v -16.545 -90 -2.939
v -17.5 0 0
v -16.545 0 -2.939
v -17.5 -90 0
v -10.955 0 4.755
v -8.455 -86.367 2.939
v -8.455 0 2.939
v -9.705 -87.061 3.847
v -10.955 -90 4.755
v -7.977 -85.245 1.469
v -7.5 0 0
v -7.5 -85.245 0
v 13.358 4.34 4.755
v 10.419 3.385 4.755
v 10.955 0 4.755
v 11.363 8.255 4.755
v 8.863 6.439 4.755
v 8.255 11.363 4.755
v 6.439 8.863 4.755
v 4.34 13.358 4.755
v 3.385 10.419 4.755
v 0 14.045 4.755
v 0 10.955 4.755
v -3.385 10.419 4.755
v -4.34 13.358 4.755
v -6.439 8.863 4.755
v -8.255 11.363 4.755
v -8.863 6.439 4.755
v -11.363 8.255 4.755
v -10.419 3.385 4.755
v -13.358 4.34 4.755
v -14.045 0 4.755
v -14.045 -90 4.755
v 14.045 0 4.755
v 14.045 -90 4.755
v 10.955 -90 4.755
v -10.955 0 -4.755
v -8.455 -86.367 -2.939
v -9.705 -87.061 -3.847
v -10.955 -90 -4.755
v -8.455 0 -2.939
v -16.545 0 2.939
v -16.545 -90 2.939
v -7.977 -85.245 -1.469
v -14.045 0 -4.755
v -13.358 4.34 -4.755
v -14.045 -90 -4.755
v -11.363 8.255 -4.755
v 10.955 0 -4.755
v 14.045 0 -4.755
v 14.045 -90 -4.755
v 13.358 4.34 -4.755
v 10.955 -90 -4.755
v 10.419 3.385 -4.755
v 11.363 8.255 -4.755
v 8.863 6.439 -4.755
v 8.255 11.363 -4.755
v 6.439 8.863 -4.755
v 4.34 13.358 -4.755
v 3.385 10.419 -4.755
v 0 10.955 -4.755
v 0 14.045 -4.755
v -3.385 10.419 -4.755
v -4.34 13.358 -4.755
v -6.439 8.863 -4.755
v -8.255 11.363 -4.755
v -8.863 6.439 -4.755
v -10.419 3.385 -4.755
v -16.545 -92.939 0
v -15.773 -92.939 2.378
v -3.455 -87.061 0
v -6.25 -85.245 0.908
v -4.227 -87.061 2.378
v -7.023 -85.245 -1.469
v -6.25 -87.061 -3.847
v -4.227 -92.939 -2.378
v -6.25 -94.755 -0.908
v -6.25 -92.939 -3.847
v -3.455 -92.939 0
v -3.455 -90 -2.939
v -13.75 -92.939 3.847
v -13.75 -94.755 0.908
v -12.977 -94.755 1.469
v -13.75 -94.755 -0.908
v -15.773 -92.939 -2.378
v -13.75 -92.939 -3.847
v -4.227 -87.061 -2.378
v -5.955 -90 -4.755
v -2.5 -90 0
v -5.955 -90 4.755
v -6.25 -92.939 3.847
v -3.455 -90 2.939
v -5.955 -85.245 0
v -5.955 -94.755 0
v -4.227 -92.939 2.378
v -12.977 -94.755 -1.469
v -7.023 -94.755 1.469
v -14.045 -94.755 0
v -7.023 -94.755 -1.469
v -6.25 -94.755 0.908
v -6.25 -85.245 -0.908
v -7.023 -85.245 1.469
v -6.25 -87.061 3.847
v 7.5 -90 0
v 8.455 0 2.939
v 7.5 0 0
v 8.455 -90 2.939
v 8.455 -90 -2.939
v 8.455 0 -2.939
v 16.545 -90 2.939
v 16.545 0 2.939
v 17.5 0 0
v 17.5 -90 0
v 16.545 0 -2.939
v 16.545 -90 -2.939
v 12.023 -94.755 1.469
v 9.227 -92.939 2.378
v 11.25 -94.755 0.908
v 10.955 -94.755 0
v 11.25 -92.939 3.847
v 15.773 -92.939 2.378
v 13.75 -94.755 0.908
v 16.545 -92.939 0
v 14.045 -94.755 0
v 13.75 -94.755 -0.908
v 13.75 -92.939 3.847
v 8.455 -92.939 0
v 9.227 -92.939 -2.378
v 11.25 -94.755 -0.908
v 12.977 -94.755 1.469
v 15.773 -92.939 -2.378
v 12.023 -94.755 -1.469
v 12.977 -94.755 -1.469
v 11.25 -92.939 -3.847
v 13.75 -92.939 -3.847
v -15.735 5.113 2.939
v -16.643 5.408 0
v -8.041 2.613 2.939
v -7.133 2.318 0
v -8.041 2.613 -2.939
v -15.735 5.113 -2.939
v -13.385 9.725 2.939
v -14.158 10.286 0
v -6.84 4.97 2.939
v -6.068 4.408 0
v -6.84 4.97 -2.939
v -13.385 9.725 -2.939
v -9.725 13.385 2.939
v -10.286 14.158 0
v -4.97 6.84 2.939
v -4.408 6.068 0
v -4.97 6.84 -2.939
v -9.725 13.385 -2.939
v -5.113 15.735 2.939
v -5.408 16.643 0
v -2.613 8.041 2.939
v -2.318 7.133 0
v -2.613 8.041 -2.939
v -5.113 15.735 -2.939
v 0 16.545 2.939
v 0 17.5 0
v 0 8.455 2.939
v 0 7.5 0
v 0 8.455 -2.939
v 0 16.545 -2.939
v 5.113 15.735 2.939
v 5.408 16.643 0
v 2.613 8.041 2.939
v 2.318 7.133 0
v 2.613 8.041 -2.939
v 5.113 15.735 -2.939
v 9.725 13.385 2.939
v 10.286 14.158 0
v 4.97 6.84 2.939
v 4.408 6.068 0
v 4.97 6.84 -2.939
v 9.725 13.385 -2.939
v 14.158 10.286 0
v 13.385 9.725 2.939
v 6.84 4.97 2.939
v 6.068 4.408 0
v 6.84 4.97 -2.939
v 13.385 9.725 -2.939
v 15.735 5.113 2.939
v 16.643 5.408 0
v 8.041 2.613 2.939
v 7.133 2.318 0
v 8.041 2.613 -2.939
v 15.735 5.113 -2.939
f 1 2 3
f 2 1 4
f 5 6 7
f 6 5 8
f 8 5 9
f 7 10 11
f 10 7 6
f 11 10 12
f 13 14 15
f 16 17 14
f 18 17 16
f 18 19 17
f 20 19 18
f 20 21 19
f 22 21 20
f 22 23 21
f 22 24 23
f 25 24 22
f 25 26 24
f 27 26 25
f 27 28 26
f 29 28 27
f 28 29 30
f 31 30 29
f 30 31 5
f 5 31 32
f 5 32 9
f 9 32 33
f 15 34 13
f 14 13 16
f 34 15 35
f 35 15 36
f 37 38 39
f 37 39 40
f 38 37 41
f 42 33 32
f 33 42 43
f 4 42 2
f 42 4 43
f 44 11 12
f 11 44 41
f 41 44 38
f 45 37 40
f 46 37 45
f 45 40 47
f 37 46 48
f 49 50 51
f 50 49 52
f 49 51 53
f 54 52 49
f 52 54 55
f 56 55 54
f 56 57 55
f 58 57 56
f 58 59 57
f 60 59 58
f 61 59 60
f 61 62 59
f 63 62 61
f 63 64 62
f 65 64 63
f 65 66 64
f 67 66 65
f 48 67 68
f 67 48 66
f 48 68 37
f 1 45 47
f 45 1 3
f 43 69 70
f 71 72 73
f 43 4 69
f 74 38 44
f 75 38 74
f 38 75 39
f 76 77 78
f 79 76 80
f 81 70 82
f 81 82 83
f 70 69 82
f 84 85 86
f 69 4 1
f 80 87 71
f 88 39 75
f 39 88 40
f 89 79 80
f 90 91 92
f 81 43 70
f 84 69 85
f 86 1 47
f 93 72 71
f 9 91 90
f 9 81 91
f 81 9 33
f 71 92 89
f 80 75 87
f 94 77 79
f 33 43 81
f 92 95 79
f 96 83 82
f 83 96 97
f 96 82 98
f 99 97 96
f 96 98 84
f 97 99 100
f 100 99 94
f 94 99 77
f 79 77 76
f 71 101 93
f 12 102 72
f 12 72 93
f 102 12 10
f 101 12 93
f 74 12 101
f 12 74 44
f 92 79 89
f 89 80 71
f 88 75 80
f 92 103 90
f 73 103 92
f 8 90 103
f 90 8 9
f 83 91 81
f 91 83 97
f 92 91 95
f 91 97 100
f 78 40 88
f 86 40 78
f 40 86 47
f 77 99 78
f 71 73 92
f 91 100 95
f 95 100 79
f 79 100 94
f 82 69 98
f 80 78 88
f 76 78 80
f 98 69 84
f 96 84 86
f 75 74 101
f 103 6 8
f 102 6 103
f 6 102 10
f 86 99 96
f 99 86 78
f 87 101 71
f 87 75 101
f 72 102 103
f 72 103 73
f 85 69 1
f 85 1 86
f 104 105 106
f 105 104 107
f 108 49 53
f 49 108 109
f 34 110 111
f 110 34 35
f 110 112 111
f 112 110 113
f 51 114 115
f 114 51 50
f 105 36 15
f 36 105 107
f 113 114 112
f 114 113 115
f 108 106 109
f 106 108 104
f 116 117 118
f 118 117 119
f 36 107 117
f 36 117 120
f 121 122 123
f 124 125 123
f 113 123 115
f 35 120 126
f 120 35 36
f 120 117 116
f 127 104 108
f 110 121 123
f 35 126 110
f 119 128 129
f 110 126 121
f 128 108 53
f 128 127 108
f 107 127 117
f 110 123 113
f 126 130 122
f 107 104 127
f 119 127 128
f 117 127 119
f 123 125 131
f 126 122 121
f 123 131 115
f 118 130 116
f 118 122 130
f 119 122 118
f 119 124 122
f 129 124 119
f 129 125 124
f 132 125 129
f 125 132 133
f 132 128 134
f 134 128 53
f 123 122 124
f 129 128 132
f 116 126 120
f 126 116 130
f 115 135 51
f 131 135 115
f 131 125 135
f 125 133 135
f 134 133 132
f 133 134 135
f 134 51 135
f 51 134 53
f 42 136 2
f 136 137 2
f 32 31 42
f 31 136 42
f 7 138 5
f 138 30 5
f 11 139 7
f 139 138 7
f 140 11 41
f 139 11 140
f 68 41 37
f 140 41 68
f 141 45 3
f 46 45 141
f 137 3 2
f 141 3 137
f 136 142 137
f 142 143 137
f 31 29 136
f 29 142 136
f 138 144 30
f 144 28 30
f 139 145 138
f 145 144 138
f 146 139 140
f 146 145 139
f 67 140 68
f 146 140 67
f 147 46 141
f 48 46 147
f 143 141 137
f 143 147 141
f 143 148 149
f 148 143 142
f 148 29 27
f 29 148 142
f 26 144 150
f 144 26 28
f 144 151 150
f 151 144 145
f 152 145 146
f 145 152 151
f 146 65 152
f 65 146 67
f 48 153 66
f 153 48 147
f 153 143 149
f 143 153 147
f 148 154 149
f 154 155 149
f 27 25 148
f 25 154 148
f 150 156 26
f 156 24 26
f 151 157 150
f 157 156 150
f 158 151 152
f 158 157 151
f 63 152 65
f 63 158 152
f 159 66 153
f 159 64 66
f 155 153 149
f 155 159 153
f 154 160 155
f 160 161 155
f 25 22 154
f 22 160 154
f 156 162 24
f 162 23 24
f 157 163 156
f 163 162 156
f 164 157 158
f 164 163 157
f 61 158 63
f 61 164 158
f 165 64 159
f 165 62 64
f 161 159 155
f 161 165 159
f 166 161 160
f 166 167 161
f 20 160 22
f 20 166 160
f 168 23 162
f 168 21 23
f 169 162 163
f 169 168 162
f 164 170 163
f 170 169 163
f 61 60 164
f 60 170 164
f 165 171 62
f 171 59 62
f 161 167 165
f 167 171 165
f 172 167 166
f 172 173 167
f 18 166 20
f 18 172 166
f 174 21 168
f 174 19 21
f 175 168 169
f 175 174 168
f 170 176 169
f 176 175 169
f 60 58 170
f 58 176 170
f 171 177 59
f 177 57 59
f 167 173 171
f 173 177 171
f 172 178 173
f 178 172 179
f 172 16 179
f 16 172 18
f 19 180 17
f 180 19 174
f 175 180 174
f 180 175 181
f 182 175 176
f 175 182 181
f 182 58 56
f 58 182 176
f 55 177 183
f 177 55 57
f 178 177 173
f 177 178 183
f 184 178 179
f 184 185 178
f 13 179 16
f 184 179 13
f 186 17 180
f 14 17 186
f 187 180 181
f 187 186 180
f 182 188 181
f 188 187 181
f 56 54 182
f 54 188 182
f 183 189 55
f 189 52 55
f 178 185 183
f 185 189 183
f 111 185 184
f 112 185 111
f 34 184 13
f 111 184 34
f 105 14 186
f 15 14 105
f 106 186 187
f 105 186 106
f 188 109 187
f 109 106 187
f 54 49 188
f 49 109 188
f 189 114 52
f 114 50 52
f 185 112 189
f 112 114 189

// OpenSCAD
thickness = 10;
gap = 15;
length = 90;
lip_length = 5;
fragments = 10;

module arms (){
  arm(0, true);
  arm(gap+thickness, false);
}

module arm(xOffset, lip){
  translate([xOffset, 0, 0])
  cylinder(r=thickness/2, h=length, $fn=fragments);

  // Round tip:
  translate([xOffset, 0, length])
  hull(){
    sphere($fn=fragments, r=thickness/2);

    if (lip) {
      translate([lip_length,0,0])
      sphere($fn=fragments, r=thickness/2);
    }
  }
}

module corner() {
  difference(){

    rotate_extrude($fn=fragments * 2)
      translate([gap/2 + thickness/2, 0, 0])
      circle(r=thickness/2, $fn=fragments);

    translate([-thickness/2 - gap, (length + thickness + gap) /-1, -thickness])
    cube([thickness + gap*2, length + thickness + gap, thickness * 2]);

  }
}

rotate(v=[1,0,0], a=90)
translate([-(gap + thickness)/2,0,0])
arms();
corner();
